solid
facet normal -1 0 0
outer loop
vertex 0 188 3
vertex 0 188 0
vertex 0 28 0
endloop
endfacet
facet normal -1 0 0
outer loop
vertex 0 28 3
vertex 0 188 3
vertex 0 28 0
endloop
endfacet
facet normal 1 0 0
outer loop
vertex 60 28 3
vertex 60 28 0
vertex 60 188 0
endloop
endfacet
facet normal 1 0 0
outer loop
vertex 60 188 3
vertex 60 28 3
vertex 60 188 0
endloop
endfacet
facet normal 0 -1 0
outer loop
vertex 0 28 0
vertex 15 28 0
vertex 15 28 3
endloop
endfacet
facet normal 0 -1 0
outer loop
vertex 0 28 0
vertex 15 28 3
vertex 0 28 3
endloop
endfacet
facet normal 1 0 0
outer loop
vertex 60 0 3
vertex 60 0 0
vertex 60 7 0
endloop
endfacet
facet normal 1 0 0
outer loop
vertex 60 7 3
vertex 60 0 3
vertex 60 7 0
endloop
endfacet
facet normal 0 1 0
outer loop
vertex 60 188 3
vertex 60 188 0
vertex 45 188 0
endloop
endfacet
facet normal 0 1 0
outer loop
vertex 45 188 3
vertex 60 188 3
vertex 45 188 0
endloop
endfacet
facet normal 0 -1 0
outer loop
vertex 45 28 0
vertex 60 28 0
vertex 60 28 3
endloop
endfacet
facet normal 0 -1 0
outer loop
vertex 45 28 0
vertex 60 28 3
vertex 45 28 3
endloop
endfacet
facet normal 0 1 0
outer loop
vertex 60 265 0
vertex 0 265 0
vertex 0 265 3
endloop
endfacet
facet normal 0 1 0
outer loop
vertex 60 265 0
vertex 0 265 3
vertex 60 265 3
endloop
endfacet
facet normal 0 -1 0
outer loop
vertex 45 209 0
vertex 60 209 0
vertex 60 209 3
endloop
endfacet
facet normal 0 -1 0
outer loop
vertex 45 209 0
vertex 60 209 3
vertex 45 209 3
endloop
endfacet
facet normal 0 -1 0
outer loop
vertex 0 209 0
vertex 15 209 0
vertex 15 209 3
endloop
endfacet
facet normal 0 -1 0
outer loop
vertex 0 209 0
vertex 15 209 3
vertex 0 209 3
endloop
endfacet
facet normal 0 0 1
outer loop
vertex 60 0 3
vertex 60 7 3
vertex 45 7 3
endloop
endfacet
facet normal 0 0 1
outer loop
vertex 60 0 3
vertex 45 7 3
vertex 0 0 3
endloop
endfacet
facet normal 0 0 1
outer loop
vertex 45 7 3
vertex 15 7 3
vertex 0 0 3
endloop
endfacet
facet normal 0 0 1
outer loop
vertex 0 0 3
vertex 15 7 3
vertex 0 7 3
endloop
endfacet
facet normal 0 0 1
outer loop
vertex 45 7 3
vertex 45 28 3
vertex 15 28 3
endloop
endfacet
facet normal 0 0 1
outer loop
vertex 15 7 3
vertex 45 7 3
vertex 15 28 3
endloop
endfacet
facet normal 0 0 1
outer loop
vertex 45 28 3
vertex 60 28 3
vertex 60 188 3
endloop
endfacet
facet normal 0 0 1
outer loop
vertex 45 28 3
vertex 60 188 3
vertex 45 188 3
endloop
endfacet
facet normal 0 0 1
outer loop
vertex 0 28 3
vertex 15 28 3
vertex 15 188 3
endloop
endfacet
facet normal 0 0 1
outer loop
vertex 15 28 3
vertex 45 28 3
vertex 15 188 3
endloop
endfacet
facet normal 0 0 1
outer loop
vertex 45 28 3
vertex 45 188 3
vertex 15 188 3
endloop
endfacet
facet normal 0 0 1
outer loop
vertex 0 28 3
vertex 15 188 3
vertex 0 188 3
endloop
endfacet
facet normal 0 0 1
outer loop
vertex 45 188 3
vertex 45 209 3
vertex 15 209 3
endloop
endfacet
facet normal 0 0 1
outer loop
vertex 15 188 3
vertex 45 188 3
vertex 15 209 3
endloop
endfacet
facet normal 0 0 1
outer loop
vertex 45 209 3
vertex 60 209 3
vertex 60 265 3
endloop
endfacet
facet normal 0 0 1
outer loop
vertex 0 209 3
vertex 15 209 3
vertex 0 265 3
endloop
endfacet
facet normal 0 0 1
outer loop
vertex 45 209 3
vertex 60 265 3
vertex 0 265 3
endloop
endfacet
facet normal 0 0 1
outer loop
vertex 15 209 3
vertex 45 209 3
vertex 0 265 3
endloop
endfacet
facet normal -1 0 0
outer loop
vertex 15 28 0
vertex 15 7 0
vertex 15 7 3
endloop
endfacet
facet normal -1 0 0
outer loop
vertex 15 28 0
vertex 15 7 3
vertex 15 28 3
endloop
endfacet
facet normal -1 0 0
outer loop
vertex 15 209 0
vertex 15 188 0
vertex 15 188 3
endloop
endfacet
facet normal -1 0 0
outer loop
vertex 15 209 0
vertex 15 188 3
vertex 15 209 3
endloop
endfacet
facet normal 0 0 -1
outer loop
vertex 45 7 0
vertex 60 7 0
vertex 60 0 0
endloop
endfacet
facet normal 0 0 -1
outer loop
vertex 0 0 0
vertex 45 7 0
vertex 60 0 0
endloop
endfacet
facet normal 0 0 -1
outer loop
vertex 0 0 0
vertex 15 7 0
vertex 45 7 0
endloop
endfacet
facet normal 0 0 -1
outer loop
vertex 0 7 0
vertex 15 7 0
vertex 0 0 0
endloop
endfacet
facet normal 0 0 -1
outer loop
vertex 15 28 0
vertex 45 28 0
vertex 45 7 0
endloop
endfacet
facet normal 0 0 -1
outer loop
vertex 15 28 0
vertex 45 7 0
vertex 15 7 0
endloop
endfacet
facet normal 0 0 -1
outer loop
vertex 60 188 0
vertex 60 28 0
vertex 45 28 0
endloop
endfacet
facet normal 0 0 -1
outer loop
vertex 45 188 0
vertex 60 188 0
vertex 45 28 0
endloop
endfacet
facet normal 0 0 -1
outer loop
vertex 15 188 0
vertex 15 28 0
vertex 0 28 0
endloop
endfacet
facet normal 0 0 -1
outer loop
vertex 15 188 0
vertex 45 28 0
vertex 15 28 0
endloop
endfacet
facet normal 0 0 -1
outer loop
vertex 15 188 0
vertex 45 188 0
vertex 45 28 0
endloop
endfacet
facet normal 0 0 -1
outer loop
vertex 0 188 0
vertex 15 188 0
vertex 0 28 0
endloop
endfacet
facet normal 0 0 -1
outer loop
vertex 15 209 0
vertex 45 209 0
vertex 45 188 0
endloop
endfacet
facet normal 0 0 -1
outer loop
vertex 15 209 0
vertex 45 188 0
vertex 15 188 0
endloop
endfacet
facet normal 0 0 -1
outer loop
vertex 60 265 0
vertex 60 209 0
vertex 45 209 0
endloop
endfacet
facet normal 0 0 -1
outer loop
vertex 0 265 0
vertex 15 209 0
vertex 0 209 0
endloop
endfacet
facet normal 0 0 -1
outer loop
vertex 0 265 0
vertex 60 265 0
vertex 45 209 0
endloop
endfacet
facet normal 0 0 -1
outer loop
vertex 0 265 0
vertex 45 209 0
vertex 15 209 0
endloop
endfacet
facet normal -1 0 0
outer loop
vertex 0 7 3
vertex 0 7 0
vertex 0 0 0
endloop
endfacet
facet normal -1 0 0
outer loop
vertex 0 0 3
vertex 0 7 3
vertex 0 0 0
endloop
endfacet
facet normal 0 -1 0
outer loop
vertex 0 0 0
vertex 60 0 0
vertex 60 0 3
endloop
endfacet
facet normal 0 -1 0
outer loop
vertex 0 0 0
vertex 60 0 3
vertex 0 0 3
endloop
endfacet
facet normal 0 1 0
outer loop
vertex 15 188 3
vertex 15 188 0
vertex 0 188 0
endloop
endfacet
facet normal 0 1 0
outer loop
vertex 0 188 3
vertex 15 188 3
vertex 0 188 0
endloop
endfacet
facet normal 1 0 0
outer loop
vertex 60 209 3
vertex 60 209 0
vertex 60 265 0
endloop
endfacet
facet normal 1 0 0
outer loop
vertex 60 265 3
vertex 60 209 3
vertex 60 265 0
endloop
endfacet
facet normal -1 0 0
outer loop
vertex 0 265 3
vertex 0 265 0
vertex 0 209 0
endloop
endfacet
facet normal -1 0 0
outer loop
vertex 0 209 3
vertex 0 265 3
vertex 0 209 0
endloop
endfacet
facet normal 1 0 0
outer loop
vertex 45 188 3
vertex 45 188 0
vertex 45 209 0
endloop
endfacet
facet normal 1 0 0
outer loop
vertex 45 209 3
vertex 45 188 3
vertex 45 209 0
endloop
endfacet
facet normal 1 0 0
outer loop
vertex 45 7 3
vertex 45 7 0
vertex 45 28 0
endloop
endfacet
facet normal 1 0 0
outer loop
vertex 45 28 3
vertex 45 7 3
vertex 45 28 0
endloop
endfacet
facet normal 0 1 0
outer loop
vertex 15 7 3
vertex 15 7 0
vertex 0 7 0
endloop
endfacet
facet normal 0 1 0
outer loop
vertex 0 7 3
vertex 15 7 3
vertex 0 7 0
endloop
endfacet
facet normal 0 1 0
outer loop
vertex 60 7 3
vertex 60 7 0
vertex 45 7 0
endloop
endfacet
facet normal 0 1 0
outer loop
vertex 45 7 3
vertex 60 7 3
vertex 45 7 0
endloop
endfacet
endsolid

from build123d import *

# Parameters (mm, degrees)
EXTRUDE_1_DEPTH     = 3
SKETCH_4_W          = 15
SKETCH_4_H          = 21
CUT_EXTRUDE_1_DEPTH = 3


with BuildPart() as part:
    # 草图1 → 凸台-拉伸1 (new body)
    with BuildSketch(Plane.XY):
        Polygon((0, 240), (0, 265), (60, 265), (60, 240), (60, 0), (0, 0), align=None)
    extrude(amount=EXTRUDE_1_DEPTH)

    # 草图4 → 切除-拉伸1 (cut)
    with BuildSketch(Plane(origin=(0, 0, 0), x_dir=(-1, 0, 0), z_dir=(0, 0, -1))):
        with Locations((-52.5, 17.5)):
            Rectangle(SKETCH_4_W, SKETCH_4_H)
        with Locations((-7.5, 17.5)):
            Rectangle(SKETCH_4_W, SKETCH_4_H)
        with Locations((-7.5, 198.5)):
            Rectangle(SKETCH_4_W, SKETCH_4_H)
        with Locations((-52.5, 198.5)):
            Rectangle(SKETCH_4_W, SKETCH_4_H)
    extrude(amount=-CUT_EXTRUDE_1_DEPTH, mode=Mode.SUBTRACT)


solid = part.part
